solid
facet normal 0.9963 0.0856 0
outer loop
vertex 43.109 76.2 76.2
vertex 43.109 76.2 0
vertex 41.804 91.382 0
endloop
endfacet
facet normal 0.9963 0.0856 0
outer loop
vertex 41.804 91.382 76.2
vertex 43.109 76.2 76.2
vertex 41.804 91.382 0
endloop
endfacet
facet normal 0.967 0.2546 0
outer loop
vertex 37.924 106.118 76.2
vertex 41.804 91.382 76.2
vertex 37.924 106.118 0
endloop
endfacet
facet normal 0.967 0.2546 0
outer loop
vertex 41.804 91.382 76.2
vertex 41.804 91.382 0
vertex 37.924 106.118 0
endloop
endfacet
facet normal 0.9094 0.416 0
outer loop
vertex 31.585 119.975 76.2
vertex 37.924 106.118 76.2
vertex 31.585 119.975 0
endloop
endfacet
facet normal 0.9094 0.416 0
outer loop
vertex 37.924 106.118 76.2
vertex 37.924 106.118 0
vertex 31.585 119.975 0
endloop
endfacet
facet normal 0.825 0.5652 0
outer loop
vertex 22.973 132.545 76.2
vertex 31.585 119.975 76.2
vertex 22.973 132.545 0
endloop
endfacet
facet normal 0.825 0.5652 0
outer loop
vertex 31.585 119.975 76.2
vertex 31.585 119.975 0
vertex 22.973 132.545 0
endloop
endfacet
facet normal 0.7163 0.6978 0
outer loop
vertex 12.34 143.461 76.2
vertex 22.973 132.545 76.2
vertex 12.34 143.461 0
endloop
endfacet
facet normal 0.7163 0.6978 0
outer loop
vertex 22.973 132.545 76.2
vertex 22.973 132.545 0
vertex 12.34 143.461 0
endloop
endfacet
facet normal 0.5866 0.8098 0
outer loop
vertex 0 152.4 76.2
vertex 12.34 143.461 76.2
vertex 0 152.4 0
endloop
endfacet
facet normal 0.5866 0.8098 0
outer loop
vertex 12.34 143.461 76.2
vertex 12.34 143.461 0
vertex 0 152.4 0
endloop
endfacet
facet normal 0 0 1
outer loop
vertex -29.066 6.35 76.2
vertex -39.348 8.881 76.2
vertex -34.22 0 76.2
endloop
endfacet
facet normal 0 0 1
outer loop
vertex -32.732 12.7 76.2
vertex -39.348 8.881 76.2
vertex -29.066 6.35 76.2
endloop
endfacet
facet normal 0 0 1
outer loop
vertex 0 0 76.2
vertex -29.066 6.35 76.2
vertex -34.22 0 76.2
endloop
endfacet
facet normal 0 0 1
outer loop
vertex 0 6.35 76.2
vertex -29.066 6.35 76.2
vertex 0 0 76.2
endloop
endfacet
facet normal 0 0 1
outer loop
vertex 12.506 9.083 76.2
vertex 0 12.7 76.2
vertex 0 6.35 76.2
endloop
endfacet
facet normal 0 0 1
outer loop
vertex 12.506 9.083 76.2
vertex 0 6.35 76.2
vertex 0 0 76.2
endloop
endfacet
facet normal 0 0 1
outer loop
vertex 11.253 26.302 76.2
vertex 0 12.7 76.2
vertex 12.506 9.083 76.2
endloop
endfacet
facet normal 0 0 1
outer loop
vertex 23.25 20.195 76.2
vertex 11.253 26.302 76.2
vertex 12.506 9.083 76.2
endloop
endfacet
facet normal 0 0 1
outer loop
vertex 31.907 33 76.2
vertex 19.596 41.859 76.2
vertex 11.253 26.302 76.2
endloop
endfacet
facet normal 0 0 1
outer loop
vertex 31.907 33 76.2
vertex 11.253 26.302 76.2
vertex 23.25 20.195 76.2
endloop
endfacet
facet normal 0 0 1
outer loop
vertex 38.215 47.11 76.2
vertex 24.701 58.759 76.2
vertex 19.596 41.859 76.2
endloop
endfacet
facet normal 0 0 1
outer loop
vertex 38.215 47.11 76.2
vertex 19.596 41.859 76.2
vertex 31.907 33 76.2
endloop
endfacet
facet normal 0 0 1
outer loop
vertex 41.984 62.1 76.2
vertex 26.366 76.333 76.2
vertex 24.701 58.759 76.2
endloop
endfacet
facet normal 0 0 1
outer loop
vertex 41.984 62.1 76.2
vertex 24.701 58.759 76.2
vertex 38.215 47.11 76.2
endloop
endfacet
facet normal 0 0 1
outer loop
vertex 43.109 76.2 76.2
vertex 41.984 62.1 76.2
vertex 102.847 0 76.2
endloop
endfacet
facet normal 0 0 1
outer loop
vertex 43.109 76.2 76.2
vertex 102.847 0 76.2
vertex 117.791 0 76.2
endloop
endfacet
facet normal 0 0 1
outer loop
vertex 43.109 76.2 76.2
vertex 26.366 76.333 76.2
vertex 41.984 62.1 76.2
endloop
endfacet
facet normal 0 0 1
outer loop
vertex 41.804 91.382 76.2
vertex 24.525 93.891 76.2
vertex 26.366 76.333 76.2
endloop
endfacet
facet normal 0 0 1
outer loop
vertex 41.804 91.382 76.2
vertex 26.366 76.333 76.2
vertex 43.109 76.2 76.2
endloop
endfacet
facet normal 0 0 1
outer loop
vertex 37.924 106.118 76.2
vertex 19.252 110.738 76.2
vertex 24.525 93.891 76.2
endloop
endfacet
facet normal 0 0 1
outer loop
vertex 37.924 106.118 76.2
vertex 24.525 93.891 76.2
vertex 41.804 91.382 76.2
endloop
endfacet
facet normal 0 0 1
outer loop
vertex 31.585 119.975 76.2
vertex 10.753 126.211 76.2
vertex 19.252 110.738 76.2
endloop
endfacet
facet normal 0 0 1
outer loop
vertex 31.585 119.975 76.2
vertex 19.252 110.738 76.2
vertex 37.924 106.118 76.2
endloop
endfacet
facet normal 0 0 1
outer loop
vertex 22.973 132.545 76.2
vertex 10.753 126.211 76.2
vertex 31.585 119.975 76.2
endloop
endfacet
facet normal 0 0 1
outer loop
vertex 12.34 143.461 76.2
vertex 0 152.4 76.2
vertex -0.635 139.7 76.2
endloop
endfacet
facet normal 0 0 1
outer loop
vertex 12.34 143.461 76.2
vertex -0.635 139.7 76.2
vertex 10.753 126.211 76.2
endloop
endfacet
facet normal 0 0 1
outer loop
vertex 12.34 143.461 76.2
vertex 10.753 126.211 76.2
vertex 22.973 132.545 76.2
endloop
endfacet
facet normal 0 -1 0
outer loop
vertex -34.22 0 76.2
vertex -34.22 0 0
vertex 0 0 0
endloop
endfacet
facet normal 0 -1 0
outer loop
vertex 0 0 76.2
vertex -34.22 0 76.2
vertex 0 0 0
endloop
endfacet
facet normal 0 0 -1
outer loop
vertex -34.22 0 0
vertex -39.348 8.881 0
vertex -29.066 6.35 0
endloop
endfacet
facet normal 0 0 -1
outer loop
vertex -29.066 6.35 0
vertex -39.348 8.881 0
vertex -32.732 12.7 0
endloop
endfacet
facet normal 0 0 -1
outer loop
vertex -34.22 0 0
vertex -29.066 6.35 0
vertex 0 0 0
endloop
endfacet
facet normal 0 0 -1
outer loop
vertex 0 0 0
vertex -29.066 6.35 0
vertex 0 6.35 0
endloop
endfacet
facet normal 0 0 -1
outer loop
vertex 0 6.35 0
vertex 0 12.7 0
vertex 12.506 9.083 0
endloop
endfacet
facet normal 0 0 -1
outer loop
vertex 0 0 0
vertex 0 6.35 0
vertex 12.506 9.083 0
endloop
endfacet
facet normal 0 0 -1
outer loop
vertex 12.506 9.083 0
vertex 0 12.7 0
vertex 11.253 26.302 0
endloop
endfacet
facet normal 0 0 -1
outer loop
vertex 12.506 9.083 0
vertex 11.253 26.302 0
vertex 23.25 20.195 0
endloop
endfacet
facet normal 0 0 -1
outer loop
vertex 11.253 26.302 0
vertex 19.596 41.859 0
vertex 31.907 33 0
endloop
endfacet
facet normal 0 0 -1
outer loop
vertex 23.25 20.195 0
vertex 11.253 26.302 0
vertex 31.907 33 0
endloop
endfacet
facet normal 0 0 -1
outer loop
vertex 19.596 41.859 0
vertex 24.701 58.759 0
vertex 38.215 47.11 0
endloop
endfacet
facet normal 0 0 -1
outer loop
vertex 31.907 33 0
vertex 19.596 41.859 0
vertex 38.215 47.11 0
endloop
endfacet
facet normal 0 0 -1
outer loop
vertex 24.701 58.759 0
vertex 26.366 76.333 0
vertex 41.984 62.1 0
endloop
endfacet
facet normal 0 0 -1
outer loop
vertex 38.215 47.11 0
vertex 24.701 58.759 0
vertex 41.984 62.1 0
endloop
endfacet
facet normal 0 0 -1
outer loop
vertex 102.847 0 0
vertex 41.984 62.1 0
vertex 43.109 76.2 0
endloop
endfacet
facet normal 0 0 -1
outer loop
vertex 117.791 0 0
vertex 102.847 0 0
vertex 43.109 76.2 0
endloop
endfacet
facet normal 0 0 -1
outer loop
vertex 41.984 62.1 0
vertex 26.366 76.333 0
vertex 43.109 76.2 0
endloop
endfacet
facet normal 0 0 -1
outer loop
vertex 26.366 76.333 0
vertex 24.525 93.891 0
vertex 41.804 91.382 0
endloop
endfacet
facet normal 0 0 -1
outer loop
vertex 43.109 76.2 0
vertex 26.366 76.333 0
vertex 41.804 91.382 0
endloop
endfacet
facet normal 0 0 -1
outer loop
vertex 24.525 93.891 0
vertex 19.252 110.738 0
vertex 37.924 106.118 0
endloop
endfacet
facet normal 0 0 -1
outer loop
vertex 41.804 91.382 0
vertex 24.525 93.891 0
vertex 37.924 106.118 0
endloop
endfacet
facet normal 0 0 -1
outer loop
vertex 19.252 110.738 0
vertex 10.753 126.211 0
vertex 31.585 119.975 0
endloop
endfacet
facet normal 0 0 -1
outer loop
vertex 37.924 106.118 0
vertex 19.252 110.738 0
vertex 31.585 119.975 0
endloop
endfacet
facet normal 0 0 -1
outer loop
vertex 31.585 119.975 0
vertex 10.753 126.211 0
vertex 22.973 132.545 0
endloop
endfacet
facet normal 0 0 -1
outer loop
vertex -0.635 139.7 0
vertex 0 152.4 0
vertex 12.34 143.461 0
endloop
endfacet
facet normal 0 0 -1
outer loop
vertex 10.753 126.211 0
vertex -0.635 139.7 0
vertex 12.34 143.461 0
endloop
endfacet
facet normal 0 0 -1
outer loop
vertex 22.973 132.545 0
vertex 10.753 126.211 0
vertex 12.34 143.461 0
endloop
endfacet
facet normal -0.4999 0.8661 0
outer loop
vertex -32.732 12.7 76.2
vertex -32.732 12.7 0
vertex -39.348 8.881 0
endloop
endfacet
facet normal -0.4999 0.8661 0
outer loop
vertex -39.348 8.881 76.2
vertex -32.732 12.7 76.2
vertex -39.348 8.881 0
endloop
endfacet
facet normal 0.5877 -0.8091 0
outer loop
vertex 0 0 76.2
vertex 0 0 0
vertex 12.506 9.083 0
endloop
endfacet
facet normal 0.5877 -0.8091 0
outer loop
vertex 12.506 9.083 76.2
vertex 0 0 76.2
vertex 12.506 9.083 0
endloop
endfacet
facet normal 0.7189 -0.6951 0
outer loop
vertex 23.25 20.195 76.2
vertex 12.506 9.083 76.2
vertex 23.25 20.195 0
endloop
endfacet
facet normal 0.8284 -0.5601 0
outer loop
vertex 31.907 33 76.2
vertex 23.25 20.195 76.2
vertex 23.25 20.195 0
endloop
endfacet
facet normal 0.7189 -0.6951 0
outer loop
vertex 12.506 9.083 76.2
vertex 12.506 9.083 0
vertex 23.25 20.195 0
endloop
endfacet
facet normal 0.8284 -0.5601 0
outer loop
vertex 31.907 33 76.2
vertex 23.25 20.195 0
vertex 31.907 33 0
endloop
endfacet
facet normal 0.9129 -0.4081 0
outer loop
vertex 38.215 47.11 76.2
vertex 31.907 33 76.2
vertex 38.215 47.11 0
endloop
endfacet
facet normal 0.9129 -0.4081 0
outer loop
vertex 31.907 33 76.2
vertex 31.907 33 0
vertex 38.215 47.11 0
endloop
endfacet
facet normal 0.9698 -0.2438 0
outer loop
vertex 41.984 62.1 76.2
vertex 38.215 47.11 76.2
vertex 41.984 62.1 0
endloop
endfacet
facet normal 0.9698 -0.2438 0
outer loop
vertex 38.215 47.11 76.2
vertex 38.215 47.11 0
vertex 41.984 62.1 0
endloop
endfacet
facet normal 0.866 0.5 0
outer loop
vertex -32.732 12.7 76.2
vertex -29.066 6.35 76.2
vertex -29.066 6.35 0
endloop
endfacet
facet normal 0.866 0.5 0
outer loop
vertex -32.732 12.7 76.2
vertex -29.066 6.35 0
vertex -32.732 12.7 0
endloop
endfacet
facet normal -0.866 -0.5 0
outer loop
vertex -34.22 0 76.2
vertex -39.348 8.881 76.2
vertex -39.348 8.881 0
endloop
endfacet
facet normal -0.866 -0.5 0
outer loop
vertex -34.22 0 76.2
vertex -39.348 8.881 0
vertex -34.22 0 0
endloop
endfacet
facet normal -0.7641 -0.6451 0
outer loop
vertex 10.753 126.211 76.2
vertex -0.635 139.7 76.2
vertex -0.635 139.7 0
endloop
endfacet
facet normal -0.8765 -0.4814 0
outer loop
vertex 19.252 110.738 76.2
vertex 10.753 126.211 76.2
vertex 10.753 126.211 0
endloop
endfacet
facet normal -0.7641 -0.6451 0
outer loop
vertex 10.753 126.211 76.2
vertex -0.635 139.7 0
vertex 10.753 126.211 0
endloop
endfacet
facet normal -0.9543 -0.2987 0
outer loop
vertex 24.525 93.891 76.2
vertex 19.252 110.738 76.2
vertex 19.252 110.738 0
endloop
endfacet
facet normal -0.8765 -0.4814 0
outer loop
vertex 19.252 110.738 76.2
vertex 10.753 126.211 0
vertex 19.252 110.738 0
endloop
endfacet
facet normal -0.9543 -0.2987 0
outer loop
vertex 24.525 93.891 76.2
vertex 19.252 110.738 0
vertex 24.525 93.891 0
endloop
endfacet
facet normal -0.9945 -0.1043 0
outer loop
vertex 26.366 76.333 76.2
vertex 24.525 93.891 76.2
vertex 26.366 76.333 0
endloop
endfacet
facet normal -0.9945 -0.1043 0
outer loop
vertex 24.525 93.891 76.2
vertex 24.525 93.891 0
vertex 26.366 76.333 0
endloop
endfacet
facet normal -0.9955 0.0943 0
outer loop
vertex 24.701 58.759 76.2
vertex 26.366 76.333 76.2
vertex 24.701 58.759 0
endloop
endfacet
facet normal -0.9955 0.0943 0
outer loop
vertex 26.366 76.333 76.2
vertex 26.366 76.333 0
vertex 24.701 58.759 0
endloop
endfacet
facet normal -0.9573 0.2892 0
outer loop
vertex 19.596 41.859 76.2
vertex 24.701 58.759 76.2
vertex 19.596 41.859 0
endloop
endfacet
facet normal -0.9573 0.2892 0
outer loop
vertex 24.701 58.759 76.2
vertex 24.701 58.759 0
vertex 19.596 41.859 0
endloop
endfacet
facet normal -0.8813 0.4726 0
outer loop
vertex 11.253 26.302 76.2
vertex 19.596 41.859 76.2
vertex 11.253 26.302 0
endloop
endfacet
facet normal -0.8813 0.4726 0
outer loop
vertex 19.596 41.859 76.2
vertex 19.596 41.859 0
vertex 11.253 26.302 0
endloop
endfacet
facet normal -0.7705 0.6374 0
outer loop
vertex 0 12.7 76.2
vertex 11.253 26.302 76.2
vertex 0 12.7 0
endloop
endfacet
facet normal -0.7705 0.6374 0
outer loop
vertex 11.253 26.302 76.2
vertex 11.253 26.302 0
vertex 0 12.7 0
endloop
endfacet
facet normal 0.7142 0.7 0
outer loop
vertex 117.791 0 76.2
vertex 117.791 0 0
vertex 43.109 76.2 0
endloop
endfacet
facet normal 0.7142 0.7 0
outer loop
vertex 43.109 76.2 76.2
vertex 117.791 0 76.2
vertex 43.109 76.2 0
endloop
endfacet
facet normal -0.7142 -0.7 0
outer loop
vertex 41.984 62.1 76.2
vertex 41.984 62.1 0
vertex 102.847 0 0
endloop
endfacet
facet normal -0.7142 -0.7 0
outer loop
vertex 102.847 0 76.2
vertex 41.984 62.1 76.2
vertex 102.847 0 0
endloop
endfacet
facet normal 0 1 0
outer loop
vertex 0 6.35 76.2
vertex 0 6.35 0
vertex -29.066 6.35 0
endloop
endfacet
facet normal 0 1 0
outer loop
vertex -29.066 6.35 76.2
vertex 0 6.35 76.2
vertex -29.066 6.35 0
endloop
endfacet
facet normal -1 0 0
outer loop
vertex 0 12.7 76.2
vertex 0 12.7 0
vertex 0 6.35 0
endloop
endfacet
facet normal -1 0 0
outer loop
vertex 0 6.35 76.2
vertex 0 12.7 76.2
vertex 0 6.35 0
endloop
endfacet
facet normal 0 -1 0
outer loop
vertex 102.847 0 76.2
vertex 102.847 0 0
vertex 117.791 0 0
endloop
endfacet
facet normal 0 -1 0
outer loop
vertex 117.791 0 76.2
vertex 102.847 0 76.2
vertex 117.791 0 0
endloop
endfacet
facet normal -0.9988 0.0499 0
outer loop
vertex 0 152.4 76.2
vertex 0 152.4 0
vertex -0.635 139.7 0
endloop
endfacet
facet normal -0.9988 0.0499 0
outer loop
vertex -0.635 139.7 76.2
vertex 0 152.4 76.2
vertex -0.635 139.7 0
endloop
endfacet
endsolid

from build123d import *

# Parameters (mm, degrees)
F1_DEPTH = 76.2


with BuildPart() as f1:
    # F0 (on Top) → F1 (new body)
    with BuildSketch(Plane.XY):
        Polygon((-34.220355, 0), (-25.4, 0), (-29.066174, 6.35), (-32.732348, 12.7), (-39.347615, 8.880674), align=None)
        with BuildLine():
            Line((-25.4, 0), (0, 0))
            ThreePointArc((0, 0), (27.857567, 26.408715), (41.984283, 62.100452))
            ThreePointArc((41.984283, 62.100452), (42.827748, 69.127812), (43.109499, 76.2))
            ThreePointArc((43.109499, 76.2), (31.585159, 119.974618), (0, 152.4))
            Line((0, 152.4), (-0.635, 139.7))
            ThreePointArc((-0.635, 139.7), (26.365937, 76.333417), (0, 12.7))
            Line((0, 12.7), (0, 6.35))
            Line((0, 6.35), (-29.066174, 6.35))
            Line((-29.066174, 6.35), (-25.4, 0))
        make_face()
        with BuildLine():
            ThreePointArc((43.109499, 76.2), (42.827748, 69.127812), (41.984283, 62.100452))
            Line((41.984283, 62.100452), (102.847256, 0))
            Line((102.847256, 0), (117.791057, 0))
            Line((117.791057, 0), (43.109499, 76.2))
        make_face()
    extrude(amount=F1_DEPTH)


solid = f1.part
